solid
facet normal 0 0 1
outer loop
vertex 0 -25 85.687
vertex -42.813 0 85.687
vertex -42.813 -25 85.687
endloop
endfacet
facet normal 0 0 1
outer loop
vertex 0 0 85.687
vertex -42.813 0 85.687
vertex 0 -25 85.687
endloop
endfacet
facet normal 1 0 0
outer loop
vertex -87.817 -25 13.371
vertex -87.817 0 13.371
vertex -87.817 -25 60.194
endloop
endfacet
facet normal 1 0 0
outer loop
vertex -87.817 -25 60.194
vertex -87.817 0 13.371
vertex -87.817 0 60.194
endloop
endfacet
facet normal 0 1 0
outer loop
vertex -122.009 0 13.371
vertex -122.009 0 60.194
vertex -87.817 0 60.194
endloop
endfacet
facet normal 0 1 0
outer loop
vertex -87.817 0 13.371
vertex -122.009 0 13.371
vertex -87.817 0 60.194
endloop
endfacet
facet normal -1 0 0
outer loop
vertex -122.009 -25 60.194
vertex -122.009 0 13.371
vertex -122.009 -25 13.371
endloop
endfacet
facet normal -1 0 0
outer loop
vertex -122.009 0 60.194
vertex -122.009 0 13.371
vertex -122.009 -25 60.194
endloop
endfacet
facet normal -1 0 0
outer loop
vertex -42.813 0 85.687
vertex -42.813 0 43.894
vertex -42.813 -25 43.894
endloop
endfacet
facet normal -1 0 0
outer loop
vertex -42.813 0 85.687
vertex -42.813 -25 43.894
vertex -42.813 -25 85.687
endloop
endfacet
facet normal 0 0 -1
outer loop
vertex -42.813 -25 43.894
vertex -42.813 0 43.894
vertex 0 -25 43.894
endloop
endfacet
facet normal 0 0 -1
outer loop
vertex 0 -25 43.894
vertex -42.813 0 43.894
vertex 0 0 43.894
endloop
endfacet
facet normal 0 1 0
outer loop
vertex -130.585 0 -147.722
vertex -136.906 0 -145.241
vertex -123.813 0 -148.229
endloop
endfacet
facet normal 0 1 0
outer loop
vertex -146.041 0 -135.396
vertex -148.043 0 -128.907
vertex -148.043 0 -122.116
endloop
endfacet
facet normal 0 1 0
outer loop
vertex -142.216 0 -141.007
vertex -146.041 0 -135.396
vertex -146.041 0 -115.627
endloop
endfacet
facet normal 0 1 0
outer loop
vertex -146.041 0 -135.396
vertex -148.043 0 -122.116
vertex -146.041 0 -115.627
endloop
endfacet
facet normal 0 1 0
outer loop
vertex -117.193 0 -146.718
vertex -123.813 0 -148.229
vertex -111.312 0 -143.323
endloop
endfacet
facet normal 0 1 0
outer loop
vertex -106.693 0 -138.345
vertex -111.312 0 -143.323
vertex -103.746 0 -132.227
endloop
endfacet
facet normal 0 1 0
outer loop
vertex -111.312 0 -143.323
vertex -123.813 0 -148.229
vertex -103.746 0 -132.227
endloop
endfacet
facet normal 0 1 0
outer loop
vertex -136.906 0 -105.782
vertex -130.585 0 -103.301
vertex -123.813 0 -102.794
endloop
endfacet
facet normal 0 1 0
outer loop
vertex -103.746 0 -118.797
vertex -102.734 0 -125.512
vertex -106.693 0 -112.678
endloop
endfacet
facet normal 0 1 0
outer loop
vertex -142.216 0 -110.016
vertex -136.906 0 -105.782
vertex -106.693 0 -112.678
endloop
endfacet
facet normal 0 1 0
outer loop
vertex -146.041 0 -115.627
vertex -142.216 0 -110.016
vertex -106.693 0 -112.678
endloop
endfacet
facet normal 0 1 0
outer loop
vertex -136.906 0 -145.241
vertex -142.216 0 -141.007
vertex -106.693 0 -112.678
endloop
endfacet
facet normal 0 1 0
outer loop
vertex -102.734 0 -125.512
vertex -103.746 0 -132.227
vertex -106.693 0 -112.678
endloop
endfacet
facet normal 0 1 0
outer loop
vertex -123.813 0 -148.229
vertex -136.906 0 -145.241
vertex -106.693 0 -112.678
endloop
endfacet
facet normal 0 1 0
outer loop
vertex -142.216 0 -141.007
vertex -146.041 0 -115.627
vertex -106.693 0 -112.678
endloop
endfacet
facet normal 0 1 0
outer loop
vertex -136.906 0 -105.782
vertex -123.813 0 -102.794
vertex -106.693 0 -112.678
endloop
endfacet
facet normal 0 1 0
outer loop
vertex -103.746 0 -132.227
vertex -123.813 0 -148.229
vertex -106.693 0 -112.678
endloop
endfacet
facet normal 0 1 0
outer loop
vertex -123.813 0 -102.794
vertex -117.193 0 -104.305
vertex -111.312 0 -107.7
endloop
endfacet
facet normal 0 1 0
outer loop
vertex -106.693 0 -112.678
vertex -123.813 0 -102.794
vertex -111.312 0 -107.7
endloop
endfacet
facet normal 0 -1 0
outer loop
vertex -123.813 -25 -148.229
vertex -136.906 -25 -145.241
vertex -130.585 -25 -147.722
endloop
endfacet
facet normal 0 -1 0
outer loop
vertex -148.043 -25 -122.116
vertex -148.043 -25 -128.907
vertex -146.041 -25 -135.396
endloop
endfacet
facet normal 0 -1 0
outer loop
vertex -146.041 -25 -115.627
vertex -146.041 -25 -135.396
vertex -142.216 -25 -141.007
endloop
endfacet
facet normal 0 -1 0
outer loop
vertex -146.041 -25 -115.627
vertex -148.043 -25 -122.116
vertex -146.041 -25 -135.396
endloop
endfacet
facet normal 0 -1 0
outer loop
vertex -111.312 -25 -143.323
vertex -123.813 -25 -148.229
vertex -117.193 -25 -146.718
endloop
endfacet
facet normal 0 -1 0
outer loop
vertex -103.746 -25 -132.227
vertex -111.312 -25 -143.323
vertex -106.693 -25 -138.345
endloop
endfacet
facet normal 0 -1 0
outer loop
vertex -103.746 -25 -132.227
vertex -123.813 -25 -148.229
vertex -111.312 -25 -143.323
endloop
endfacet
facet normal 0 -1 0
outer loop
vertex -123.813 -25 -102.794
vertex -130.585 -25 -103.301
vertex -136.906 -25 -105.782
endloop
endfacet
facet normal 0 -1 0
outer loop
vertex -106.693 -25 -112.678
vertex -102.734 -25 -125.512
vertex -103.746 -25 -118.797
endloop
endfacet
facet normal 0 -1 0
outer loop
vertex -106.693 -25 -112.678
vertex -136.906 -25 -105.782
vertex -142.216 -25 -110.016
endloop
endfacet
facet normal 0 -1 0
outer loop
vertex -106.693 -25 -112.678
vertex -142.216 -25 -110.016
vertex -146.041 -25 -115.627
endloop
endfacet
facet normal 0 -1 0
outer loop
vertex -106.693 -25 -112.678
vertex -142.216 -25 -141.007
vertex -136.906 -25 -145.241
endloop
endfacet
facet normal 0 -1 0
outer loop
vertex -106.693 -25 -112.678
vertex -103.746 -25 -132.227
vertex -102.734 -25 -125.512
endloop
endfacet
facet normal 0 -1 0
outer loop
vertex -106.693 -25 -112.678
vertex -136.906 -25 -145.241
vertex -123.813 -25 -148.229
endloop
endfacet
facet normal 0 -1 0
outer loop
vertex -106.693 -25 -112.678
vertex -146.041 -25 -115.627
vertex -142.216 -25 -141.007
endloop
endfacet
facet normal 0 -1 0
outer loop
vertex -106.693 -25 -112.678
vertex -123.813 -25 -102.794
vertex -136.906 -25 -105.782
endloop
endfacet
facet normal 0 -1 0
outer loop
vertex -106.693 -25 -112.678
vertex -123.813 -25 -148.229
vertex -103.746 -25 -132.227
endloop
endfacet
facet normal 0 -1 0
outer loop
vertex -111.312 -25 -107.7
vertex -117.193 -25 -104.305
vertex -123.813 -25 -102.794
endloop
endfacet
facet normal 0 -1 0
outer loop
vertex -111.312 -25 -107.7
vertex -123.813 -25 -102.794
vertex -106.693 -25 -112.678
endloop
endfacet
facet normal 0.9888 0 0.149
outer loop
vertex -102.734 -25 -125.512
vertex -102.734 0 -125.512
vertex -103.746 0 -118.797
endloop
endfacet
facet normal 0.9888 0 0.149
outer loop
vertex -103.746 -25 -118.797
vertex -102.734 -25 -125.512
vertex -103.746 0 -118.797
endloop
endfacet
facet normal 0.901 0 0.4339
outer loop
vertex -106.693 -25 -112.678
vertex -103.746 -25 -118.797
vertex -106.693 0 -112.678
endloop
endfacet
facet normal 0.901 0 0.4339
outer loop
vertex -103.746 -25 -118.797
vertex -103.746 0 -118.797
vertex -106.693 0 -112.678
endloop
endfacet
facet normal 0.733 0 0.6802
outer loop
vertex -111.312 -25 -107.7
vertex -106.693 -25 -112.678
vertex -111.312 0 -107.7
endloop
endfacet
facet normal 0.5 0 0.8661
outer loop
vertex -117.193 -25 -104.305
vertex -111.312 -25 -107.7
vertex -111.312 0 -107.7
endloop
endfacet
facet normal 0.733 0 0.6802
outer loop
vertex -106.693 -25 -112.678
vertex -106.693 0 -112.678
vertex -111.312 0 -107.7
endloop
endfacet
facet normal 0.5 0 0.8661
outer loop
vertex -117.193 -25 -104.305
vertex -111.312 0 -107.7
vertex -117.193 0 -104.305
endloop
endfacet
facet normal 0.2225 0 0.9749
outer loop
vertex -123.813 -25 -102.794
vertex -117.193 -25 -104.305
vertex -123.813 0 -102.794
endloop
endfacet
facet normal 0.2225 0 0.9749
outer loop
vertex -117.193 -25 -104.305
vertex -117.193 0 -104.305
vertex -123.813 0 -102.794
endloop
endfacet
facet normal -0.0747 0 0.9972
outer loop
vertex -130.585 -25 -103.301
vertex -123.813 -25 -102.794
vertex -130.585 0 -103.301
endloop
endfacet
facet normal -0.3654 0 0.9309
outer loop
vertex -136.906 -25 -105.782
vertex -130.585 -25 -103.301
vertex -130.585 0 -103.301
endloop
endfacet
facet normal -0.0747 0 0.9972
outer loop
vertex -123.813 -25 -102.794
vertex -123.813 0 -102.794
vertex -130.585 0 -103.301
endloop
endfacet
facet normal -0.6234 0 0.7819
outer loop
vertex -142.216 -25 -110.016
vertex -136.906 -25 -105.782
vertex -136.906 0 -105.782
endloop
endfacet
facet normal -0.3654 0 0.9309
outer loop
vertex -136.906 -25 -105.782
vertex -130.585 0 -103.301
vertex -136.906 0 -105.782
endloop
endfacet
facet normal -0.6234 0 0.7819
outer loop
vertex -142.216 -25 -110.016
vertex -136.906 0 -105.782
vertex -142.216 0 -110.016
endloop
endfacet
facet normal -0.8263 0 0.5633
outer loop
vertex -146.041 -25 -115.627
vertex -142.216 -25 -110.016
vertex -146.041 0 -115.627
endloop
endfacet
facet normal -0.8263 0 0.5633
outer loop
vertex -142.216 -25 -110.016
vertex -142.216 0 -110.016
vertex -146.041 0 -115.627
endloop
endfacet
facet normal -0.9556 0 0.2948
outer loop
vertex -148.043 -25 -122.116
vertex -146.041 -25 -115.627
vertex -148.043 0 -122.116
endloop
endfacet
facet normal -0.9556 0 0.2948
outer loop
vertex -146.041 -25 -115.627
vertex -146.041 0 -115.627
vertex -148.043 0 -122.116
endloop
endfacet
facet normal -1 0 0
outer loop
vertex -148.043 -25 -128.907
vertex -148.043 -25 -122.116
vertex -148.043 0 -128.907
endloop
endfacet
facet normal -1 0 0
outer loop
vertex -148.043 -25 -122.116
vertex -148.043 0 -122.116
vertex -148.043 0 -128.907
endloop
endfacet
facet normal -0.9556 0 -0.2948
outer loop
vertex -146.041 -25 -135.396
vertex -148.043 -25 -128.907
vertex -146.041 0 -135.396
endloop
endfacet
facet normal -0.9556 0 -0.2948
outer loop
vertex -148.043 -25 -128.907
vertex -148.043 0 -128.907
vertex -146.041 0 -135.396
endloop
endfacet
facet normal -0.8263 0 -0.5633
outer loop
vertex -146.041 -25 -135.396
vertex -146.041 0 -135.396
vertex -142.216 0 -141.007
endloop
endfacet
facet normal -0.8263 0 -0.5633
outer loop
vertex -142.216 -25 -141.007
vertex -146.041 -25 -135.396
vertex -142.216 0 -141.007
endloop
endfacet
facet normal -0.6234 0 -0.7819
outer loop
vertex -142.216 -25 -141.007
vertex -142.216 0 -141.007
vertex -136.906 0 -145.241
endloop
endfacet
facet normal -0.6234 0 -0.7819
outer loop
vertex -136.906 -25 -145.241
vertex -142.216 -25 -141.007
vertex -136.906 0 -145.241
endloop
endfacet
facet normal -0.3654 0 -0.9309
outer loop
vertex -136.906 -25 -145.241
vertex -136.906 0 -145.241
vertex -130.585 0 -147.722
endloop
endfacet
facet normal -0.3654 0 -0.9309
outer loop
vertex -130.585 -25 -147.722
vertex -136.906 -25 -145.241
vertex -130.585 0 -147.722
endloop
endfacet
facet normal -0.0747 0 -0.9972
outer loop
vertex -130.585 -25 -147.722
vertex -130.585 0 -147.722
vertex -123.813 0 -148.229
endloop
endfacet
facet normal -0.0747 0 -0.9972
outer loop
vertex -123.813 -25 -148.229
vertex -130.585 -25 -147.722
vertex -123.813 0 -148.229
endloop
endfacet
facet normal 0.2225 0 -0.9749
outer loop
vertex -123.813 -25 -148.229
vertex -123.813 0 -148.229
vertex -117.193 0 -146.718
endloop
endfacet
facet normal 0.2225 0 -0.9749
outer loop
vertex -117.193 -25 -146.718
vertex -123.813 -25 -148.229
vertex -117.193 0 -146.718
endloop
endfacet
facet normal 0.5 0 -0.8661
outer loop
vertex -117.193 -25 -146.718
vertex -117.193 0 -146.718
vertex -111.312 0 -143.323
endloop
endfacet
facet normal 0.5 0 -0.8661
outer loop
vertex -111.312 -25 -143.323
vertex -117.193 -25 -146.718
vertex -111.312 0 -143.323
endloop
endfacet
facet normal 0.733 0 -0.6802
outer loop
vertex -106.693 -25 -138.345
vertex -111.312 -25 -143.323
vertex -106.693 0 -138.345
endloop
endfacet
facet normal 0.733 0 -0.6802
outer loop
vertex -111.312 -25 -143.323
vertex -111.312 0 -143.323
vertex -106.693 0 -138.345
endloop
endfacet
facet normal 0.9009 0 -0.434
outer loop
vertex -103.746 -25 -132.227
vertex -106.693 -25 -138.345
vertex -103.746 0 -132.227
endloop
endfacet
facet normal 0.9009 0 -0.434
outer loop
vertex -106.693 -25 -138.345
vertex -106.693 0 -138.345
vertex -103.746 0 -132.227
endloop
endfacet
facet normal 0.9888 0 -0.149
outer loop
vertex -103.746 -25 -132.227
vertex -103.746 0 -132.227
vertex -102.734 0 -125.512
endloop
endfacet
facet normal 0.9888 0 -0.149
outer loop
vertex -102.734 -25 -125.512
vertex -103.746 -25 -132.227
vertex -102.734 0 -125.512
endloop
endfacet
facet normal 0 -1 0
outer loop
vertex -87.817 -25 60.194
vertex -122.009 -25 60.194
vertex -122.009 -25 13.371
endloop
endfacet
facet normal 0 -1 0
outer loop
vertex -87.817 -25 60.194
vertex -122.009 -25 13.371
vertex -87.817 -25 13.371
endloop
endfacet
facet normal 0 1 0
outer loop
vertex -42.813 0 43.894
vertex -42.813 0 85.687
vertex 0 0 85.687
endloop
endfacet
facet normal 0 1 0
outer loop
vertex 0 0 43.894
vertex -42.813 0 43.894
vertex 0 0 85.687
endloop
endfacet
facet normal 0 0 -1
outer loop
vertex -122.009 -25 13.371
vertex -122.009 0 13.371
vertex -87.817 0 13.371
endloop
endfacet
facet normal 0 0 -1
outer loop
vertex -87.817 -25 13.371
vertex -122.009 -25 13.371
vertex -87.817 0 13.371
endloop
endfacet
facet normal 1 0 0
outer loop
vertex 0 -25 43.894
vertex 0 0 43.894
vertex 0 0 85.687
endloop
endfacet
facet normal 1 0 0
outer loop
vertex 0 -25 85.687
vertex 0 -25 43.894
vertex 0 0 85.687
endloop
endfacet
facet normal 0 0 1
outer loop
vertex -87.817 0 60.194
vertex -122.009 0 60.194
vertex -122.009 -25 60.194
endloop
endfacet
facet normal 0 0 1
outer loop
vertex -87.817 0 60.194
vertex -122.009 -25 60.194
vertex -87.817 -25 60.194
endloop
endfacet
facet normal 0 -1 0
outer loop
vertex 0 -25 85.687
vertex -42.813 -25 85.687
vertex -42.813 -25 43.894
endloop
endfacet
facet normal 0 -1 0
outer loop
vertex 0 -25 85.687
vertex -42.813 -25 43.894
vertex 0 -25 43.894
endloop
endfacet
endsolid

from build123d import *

# Parameters (mm, degrees)
F0_W     = 34.191712
F0_H     = 46.82366
F0_W_2   = 42.812705
F0_H_2   = 41.792248
F1_DEPTH = 25
F2_R     = 22.781451
F3_DEPTH = 25


with BuildPart() as f1:
    # F0 (on Front) → F1 (new body)
    with BuildSketch(Plane.XZ):
        with Locations((-104.913041, 36.782573)):
            Rectangle(F0_W, F0_H)
        with Locations((-21.406353, 64.790381)):
            Rectangle(F0_W_2, F0_H_2)
    extrude(amount=F1_DEPTH)


with BuildPart() as f3:
    # F2 (on Front) → F3 (new body)
    with BuildSketch(Plane.XZ):
        with Locations((-125.515729, -125.511646)):
            Circle(F2_R)
    extrude(amount=F3_DEPTH)


solid = Compound([f1.part, f3.part])
